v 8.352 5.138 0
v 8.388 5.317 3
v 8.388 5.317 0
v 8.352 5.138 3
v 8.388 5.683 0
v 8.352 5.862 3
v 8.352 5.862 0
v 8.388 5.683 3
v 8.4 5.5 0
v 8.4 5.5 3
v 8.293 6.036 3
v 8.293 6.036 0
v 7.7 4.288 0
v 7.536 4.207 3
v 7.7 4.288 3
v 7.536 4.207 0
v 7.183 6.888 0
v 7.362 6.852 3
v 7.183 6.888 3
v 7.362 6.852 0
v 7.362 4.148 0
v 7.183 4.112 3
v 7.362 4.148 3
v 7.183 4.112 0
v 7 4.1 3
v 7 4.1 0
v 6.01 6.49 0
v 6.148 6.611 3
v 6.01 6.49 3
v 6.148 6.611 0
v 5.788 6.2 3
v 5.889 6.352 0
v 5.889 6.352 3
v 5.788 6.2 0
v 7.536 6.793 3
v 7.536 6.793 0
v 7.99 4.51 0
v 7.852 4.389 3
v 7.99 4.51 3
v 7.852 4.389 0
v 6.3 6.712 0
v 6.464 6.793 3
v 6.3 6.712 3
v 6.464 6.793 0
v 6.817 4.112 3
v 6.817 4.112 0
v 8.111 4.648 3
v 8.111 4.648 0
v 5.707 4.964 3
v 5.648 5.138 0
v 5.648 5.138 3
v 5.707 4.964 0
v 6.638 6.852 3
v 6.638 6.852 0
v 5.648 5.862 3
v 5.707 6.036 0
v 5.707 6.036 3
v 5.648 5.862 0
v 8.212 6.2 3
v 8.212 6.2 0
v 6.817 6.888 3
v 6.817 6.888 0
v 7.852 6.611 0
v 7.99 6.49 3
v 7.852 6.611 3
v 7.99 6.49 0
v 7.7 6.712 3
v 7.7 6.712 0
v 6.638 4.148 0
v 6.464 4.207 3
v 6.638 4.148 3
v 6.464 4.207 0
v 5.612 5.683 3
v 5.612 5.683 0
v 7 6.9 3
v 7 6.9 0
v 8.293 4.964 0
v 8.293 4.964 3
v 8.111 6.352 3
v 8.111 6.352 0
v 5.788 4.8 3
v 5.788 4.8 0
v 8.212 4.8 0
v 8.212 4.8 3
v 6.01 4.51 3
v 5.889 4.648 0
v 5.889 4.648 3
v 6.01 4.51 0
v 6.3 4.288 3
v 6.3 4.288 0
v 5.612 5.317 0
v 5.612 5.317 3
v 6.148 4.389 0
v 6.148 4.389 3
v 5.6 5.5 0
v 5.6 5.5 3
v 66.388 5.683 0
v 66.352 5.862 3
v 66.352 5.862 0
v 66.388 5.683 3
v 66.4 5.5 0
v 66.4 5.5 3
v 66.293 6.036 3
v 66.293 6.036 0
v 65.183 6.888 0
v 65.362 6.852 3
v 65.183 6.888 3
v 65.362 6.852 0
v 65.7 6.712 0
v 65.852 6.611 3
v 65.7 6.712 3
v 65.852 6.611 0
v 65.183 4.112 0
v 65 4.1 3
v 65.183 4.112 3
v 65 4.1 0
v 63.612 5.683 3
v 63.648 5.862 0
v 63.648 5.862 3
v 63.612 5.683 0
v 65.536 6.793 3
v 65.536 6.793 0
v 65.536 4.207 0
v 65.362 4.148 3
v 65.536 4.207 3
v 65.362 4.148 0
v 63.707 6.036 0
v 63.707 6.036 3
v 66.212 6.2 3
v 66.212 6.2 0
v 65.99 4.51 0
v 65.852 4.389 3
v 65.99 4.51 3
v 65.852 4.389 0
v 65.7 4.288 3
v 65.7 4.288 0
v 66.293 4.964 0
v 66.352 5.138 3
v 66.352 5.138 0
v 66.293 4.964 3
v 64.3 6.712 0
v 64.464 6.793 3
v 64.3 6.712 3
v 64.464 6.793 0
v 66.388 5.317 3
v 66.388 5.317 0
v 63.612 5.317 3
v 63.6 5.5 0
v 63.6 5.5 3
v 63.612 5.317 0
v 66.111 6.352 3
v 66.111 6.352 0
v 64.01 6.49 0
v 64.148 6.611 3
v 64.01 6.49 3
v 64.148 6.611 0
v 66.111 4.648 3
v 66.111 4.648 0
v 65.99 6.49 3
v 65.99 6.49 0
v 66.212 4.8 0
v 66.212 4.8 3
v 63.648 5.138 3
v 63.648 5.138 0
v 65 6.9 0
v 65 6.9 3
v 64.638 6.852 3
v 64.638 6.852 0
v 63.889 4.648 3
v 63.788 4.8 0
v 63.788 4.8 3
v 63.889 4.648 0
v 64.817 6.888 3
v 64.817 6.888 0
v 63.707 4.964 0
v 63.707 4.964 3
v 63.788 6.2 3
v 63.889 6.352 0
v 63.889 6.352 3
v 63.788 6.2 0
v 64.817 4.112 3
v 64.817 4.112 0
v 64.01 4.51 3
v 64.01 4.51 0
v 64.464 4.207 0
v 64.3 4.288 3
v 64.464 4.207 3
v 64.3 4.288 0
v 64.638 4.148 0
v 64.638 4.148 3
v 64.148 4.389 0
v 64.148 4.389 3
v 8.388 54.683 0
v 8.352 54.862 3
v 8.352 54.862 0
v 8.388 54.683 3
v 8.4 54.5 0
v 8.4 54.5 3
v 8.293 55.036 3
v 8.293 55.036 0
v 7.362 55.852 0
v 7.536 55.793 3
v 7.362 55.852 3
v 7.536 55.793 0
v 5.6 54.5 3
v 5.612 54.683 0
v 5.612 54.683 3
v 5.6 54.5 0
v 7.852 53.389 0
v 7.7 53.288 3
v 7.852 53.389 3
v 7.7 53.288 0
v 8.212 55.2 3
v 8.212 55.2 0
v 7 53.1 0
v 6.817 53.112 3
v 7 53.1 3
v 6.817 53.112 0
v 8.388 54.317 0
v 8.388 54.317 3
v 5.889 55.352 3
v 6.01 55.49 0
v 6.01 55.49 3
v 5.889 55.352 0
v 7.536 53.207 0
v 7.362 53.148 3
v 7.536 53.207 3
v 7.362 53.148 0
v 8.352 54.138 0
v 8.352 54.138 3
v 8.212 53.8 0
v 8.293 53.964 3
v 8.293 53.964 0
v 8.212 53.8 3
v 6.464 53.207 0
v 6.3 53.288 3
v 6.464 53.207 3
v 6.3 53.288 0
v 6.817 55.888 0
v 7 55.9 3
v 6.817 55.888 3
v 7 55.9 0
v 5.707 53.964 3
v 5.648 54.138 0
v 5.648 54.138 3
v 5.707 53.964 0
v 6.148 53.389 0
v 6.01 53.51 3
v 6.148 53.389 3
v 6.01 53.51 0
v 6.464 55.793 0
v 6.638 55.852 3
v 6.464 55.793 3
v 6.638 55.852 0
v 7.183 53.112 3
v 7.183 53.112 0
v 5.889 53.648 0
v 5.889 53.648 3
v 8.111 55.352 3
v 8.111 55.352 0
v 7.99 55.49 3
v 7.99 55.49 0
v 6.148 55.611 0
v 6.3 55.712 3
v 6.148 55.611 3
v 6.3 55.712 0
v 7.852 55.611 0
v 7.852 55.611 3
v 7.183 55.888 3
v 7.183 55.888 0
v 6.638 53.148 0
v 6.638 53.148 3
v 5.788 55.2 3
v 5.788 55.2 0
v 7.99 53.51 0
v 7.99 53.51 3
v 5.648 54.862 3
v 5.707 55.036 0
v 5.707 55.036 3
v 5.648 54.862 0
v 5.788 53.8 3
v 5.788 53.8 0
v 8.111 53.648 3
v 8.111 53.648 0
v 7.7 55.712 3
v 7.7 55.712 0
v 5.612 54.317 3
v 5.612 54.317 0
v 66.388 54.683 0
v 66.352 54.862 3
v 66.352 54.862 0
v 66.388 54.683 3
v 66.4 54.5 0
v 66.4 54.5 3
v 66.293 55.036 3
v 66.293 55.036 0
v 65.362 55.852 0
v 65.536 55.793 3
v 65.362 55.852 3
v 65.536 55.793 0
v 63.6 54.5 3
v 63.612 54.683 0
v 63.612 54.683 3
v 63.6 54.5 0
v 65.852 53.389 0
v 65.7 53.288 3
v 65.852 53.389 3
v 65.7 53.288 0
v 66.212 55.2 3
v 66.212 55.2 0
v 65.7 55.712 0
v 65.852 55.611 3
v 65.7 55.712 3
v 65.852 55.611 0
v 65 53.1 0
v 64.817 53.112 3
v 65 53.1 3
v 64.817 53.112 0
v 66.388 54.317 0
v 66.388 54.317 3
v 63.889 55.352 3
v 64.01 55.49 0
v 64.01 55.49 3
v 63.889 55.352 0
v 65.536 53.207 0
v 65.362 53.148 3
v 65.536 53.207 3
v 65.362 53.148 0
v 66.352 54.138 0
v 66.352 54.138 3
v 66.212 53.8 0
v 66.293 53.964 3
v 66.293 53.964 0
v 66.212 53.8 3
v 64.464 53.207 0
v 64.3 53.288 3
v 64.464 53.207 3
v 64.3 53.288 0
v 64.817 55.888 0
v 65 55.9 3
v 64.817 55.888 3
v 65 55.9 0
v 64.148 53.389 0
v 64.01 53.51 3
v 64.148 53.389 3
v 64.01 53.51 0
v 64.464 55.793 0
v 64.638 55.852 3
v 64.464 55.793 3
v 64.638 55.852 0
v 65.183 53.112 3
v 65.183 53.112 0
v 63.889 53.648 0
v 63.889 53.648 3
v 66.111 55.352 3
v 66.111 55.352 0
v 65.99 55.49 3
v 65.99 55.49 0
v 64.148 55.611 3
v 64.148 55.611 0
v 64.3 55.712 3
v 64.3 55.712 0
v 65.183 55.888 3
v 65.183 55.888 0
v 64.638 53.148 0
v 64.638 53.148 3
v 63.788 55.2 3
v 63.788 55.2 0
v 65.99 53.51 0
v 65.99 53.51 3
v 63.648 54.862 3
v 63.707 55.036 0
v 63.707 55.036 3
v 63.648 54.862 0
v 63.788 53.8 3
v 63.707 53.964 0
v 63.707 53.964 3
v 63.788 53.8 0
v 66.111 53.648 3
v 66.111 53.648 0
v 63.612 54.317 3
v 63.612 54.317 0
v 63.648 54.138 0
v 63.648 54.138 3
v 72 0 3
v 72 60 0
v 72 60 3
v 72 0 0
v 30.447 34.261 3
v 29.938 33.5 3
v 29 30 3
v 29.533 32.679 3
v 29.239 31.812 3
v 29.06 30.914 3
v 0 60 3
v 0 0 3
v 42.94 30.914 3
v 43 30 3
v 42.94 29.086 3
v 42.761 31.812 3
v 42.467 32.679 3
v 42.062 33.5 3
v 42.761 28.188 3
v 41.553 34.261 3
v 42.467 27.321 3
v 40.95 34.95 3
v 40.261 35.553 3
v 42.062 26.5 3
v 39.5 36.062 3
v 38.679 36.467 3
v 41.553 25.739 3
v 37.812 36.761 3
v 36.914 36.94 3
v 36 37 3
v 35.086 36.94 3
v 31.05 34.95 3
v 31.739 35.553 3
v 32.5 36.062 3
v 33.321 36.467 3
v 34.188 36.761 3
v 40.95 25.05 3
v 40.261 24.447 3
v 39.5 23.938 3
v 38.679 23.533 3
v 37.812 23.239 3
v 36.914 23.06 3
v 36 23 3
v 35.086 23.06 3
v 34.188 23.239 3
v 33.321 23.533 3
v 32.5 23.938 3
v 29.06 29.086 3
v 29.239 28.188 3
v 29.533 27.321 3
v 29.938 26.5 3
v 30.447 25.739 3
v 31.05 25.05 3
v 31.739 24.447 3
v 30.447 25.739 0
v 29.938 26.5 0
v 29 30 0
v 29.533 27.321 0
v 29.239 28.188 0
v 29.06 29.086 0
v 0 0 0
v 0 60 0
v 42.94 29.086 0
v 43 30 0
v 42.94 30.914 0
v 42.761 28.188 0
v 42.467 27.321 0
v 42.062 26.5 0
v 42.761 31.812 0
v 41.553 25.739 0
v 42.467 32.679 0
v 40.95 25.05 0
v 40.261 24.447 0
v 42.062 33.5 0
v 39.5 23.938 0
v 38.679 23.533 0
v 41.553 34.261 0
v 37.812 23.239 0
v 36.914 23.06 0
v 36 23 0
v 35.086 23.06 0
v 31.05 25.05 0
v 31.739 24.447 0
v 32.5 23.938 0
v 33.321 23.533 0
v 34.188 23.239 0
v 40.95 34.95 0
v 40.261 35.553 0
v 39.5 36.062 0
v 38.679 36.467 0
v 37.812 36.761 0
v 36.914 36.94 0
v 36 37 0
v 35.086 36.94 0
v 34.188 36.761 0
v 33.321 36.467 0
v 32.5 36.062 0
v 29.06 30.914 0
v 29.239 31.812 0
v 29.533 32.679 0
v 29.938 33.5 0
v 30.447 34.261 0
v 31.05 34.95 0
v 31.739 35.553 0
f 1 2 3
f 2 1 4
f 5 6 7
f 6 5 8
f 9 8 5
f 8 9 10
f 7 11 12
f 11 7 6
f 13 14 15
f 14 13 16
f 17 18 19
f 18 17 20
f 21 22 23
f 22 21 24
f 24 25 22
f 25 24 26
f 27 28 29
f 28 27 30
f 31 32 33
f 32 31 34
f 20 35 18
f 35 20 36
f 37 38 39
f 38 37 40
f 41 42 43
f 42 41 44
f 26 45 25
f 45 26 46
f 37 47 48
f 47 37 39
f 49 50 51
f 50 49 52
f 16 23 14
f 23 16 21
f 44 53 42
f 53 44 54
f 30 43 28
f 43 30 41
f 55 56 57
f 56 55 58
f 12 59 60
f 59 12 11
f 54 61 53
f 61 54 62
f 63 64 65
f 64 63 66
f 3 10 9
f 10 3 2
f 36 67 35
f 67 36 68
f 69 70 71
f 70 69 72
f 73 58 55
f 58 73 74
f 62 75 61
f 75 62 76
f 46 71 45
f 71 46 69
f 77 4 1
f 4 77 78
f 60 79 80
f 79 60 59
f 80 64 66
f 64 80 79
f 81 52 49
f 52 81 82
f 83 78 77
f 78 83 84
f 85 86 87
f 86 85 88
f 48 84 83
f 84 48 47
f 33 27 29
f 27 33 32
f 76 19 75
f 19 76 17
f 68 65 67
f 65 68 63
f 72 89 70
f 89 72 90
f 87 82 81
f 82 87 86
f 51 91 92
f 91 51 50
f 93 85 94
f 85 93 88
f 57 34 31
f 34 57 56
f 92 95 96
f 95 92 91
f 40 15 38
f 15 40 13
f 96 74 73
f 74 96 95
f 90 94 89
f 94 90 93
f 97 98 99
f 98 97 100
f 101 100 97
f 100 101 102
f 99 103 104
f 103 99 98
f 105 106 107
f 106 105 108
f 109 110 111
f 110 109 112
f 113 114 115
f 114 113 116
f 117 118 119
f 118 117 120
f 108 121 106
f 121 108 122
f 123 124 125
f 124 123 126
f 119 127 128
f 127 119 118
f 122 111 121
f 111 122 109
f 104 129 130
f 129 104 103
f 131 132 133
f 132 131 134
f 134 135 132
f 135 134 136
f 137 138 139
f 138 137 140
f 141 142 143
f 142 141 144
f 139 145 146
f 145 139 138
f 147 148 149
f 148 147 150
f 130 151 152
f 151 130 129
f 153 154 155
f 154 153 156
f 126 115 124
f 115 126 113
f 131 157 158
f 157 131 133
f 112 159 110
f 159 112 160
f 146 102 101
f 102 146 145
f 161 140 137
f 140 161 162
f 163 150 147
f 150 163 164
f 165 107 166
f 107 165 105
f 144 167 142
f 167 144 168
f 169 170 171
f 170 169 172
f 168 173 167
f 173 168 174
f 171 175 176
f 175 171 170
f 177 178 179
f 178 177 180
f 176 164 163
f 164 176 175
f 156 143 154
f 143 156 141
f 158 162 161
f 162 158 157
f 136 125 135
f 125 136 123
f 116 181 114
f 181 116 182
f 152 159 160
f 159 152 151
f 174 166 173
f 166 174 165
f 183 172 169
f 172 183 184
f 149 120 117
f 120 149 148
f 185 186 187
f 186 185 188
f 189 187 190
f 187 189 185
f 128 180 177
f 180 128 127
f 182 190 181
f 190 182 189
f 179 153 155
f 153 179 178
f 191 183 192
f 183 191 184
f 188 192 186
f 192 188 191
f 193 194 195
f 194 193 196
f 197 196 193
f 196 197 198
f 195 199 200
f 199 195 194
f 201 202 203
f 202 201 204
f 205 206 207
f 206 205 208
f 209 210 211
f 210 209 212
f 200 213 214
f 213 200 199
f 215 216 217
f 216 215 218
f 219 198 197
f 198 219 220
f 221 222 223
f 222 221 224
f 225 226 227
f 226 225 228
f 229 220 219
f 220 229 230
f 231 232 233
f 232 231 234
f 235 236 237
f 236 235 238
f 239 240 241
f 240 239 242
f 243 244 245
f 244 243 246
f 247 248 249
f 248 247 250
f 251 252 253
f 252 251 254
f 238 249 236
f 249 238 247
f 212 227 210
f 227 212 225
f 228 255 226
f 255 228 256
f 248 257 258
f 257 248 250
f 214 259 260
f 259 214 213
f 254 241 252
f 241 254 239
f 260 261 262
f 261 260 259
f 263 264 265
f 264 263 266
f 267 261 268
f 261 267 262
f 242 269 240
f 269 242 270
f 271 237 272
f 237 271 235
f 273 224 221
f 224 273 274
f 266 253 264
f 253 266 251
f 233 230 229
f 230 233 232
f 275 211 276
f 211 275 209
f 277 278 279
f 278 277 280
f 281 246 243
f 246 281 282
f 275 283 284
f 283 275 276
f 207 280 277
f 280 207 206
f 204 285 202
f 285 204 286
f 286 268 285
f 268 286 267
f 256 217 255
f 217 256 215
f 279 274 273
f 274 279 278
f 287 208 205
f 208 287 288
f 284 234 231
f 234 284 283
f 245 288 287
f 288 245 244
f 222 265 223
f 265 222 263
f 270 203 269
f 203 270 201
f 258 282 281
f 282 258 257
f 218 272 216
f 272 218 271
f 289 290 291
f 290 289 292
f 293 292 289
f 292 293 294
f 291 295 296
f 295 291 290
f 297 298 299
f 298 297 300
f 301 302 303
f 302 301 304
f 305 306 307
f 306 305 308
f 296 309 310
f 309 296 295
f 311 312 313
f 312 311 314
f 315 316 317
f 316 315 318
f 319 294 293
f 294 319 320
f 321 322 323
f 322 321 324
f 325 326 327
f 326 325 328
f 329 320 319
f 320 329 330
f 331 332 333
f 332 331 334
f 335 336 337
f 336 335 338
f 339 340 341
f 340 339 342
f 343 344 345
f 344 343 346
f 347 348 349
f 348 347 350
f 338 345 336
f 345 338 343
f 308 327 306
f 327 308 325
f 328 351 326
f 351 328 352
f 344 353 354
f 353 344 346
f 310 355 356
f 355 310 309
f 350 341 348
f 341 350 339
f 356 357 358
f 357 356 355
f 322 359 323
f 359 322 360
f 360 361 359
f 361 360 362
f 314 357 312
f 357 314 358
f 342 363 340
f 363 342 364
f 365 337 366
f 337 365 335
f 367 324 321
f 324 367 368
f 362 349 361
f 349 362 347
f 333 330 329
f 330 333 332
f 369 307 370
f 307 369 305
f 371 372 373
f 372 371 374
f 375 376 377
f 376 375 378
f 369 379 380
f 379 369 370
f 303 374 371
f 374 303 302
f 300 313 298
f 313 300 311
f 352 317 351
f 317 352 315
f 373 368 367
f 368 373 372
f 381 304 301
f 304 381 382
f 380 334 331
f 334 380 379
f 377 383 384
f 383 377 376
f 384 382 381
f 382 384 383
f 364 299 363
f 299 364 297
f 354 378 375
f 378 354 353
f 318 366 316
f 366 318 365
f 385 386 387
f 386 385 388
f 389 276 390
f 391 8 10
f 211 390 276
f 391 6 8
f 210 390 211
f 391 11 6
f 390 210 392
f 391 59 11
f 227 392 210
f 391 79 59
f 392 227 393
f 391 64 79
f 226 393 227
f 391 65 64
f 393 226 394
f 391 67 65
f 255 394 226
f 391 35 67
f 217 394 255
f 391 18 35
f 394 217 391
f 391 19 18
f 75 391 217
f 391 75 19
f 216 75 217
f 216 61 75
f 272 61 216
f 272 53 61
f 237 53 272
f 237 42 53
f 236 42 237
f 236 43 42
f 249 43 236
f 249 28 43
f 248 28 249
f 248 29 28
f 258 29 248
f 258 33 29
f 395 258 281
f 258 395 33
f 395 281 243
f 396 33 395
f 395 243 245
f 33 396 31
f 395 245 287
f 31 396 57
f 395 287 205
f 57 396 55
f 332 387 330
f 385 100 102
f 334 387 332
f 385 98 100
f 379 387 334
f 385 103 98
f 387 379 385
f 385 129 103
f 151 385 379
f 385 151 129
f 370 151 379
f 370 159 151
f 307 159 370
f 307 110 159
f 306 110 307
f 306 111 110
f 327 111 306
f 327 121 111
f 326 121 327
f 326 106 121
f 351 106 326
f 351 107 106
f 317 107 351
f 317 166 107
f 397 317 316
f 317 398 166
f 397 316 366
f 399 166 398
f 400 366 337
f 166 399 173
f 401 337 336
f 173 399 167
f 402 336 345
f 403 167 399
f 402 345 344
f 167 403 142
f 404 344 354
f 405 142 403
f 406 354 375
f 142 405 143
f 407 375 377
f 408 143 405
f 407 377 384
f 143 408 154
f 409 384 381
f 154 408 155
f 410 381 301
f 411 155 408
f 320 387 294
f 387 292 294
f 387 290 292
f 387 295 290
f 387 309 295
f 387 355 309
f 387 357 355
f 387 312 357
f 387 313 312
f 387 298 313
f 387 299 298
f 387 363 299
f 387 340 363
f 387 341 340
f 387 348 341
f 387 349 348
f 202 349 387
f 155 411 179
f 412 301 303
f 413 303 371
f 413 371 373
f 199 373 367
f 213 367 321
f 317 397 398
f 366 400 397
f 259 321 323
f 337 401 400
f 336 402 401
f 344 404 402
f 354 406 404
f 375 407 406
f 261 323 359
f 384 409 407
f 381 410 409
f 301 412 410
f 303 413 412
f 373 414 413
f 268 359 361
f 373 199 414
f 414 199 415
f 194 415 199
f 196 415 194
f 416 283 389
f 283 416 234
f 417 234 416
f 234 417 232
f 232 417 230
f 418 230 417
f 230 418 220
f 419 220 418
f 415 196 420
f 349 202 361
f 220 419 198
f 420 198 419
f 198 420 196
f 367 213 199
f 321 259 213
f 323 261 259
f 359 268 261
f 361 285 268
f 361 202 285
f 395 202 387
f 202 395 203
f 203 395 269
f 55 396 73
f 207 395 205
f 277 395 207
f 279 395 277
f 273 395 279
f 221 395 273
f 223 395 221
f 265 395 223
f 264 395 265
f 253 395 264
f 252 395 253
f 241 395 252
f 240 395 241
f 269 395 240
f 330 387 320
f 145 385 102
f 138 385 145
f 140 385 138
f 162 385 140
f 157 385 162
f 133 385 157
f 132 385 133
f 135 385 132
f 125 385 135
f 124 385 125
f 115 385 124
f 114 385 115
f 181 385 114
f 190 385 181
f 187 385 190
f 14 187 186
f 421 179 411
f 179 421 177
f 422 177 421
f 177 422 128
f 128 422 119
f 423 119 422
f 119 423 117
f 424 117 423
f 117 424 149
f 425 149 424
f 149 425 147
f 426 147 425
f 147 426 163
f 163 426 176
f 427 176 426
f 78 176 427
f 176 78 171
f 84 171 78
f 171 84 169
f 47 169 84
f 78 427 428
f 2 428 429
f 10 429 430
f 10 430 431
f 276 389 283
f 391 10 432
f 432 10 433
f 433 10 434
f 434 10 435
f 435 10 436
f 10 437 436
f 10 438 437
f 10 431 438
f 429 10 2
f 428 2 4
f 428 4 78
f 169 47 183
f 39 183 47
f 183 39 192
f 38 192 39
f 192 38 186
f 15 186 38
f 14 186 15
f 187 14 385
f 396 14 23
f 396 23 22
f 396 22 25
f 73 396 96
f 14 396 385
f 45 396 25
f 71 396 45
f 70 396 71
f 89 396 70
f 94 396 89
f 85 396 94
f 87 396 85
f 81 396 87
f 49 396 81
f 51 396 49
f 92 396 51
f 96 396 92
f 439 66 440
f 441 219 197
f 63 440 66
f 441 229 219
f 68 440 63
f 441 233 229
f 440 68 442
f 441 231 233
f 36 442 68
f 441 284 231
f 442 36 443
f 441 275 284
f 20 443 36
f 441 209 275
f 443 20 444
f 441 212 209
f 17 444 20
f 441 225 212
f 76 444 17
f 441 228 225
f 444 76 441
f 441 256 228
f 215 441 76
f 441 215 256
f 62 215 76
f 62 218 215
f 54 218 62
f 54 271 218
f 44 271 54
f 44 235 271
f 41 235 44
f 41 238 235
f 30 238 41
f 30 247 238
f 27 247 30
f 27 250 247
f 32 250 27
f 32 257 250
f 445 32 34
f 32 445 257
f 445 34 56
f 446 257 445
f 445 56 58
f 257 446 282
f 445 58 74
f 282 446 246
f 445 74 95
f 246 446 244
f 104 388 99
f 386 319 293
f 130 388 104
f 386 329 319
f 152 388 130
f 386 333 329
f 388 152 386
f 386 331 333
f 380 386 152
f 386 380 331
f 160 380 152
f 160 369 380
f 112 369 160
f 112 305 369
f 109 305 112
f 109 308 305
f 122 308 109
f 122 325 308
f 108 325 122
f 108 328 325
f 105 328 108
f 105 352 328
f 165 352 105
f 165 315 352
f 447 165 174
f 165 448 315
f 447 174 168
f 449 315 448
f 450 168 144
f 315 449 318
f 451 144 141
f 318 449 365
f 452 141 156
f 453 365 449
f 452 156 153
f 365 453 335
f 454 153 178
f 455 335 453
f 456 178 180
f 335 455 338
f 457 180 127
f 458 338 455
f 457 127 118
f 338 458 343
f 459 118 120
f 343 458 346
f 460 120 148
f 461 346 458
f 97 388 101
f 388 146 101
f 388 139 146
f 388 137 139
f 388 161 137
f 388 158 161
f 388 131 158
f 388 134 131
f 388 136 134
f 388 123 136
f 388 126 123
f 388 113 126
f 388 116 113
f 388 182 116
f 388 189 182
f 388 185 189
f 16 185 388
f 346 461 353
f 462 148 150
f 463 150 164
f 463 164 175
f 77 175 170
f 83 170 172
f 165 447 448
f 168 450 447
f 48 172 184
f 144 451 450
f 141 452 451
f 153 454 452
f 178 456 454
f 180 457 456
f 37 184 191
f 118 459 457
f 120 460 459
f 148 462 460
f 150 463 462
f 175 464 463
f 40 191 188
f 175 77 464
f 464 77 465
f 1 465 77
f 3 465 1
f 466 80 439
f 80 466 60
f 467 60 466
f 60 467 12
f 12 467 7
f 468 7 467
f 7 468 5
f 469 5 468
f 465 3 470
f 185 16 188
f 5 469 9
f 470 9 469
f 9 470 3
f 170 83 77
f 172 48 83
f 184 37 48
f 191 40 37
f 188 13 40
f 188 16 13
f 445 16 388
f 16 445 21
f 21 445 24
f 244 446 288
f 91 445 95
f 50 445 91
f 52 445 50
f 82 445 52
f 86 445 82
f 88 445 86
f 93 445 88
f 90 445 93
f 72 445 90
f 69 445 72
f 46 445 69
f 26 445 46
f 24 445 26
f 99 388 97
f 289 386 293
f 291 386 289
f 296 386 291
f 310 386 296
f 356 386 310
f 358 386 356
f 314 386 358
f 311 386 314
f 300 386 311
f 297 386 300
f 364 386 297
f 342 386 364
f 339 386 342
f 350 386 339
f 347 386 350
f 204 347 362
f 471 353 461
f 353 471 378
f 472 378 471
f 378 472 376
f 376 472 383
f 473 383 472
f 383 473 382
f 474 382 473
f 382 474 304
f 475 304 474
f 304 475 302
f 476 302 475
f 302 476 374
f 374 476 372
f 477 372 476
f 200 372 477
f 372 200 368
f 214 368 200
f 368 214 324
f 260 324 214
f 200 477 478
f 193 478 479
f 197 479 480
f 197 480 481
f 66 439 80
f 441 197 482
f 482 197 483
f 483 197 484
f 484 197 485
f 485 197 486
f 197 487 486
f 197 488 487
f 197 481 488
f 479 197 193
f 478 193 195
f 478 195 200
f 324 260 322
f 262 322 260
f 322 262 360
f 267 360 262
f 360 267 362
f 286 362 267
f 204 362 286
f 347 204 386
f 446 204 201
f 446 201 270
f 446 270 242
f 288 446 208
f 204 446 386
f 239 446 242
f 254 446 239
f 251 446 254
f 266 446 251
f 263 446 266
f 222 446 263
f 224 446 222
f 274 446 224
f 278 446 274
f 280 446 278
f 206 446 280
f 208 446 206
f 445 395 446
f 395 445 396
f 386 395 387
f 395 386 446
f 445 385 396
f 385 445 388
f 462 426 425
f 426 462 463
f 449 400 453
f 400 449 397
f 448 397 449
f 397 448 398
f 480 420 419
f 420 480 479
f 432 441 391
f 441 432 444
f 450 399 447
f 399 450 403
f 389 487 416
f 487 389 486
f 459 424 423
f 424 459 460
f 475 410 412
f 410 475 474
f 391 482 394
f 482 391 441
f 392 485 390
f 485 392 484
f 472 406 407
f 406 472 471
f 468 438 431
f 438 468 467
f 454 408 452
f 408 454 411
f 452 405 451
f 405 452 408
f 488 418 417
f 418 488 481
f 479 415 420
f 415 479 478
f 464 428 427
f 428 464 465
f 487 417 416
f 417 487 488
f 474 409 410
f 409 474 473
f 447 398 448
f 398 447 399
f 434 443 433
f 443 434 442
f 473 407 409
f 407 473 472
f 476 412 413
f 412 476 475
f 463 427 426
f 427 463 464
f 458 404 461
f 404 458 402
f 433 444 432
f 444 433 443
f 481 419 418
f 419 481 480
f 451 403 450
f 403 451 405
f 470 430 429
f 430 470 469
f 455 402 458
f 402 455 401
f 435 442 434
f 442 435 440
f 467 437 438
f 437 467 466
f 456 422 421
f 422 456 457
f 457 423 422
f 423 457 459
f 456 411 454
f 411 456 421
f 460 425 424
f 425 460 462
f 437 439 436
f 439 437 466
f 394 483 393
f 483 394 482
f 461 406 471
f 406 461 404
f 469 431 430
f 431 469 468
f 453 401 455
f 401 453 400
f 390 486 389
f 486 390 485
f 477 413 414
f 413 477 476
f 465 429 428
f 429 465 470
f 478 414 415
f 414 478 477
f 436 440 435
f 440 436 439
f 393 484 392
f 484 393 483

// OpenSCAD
// Raspberry Pi optional mounting plate, units mm
$fn=48; L=72; W=60; T=3; pix=58; piy=49; m25=2.8;
difference(){
 cube([L,W,T]);
 translate([L/2-pix/2,W/2-piy/2,-1]){
  cylinder(h=T+2,d=m25); translate([pix,0,0]) cylinder(h=T+2,d=m25);
  translate([0,piy,0]) cylinder(h=T+2,d=m25); translate([pix,piy,0]) cylinder(h=T+2,d=m25);
 }
 translate([L/2,W/2,-1]) cylinder(h=T+2,d=14);
}
